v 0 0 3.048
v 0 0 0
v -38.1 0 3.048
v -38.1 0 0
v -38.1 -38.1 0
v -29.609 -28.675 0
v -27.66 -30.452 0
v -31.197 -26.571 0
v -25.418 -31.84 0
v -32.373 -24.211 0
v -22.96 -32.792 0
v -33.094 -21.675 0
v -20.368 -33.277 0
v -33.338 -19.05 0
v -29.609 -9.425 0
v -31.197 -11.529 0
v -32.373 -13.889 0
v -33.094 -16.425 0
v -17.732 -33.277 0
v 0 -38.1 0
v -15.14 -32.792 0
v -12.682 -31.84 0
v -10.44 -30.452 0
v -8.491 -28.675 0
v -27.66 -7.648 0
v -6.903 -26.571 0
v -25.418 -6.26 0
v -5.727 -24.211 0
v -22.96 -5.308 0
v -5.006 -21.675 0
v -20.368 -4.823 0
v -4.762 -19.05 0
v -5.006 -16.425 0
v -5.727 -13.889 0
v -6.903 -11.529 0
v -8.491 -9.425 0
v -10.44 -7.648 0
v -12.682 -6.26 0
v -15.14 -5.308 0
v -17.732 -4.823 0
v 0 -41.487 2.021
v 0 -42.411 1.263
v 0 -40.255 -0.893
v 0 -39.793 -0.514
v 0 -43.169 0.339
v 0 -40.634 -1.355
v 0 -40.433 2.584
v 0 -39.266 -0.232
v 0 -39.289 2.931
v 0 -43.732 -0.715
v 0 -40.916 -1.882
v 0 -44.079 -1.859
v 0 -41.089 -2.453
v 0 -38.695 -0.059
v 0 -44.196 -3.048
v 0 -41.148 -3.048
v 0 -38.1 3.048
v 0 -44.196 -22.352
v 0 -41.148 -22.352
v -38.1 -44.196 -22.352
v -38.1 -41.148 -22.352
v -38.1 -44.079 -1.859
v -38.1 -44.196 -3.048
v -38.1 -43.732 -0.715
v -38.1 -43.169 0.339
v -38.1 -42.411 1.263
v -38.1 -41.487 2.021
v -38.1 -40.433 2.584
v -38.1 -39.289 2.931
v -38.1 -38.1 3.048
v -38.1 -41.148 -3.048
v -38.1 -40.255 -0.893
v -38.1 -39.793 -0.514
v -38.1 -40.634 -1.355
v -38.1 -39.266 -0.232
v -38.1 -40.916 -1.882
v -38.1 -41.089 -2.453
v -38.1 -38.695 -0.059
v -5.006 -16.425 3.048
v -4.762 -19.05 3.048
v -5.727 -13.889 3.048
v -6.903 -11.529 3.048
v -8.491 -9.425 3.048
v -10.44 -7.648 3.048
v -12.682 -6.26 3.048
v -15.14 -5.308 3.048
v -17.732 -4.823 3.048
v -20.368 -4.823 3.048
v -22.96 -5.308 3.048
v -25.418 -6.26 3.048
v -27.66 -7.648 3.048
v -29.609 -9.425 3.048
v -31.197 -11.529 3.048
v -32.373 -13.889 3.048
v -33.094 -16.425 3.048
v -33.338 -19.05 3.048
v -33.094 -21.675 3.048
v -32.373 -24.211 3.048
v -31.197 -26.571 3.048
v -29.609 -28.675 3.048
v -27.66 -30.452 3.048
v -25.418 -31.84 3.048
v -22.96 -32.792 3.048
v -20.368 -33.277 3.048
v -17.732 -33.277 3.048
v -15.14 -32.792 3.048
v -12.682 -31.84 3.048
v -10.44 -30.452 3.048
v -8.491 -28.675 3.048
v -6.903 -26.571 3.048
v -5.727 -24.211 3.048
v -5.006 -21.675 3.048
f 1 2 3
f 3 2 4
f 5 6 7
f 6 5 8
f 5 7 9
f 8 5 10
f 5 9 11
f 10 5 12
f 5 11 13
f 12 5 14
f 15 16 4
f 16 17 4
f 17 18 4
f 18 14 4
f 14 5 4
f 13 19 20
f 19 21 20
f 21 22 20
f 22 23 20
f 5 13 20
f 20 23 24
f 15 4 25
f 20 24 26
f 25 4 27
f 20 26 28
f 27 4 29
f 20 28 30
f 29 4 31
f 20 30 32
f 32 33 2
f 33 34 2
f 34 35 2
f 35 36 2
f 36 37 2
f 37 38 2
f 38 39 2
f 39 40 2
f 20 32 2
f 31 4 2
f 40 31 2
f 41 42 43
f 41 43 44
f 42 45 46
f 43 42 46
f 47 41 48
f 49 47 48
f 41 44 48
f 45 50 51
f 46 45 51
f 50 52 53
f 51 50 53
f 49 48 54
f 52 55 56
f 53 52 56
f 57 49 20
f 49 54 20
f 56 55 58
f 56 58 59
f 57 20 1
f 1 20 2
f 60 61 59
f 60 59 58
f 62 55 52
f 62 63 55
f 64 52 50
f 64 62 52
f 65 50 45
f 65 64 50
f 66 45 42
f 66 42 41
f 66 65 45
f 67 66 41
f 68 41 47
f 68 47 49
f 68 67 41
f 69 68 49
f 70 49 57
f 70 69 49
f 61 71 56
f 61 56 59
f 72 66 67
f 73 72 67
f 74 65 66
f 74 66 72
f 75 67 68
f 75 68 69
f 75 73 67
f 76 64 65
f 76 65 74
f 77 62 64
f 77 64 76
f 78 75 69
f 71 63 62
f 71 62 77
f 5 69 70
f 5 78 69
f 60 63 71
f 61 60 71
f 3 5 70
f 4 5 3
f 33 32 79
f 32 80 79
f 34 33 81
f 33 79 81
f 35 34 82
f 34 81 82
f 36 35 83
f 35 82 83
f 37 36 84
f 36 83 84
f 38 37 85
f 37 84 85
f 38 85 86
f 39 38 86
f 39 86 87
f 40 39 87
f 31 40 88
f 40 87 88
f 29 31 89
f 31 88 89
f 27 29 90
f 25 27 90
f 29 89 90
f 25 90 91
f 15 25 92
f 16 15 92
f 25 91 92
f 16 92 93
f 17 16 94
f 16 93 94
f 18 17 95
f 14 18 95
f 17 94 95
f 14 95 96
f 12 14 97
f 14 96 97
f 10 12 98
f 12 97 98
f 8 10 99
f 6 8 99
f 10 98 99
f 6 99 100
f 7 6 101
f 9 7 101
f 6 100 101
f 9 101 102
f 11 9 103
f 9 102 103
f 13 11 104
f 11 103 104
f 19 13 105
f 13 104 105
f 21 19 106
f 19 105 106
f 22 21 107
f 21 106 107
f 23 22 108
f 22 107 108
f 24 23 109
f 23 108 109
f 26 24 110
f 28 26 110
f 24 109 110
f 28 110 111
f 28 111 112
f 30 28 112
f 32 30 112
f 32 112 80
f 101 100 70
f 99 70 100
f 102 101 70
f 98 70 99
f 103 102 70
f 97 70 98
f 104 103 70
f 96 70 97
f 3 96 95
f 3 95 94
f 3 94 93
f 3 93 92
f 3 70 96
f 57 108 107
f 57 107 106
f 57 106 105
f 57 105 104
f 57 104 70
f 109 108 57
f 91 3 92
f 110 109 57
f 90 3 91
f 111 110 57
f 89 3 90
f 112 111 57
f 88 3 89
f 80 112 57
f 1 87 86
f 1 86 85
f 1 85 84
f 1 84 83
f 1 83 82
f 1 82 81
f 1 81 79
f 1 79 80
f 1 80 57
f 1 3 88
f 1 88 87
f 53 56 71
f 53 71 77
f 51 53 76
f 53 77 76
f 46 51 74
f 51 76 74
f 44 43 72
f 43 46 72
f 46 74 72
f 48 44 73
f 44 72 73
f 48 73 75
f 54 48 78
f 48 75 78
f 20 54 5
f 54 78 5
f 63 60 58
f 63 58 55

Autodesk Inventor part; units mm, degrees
ref_plane "YZ Plane" through (0, 0, 0) normal (1, 0, 0) x (0, 1, 0)
ref_plane "XZ Plane" through (0, 0, 0) normal (0, 1, 0) x (-1, 0, 0)
ref_plane "XY Plane" through (0, 0, 0) normal (0, 0, 1) x (1, 0, 0)
sketch "Sketch1" plane through (0, 0, 0) normal (0, 0, 1) x (1, 0, 0)
  line L0 (0, 0) -> (-38.1, 0)
  line L1 (-19.05, 0) -> (-19.05, -38.1)
  line L2 (-19.05, -38.1) -> (-38.1, -38.1)
  line L3 (-38.1, -38.1) -> (-38.1, 0)
  line L4 (-19.05, -38.1) -> (0, -38.1)
  line L5 (0, 0) -> (0, -38.1)
  dimension "d0" = 38.1
  dimension "d1" = 38.1
  dimension "d2" = 19.05
  dimension "d3" = 19.05
extrude "Plate1" add sketch "Sketch1" along normal blind 3.048
sketch "Sketch2" plane through (0, 0, 3.048) normal (0, 0, 1) x (1, 0, 0)
  line L0 (-38.1, 0) -> (0, 0) projected
  line L1 (0, -38.1) -> (-38.1, -38.1) projected
  line L2 (-19.05, 0) -> (-19.05, -19.05)
  circle A0 centre (-19.05, -19.05) radius 14.2875
  dimension "d7" = 19.05
  dimension "d8" = 28.575
extrude "Cut1" cut sketch "Sketch2" against normal blind 3.048
sketch "Sketch3" plane through (-38.1, -41.148, -3.048) normal (0, -1, 0) x (1, 0, 0)
  line L0 (38.1, 0) -> (0, 0)
  line L1 (0, 0) -> (0, -19.304)
  line L2 (0, -19.304) -> (38.1, -19.304)
  line L3 (38.1, -19.304) -> (38.1, 0)
edge flange "Flange1" height 25.4 angle 90 thickness 3.048 bend radius 3.048 thickness toward (0, -1, 0) relief straight relief width 3.048 relief depth 1.524 edges at (-19.05, -38.1, 0) wall of the first edge with corners at (0, -41.148, -3.048) (-38.1, -41.148, -3.048) (-38.1, -41.148, -22.352) (0, -41.148, -22.352)
bend "Bend1"
corner "Corner1"
sketch "Sketch5" plane through (-38.1, -41.148, -22.352) normal (0, 1, 0) x (1, 0, 0)
  line L0 (0, -19.304) -> (38.1, -19.304) projected
  line L1 (38.1, 0) -> (38.1, -19.304) projected
  line L2 (38.1, 0) -> (0, 0) projected
  line L3 (0, 0) -> (0, -19.304) projected
  point P0 (38.1, -22.352)
equation "\"d9\" = Thickness"
equation "\"d11\" = BendReliefWidth"
equation "\"d12\" = BendReliefDepth"
equation "\"d13\" = MinimumRemnant"
equation "\"d14\" = BendRadius"
equation "\"d17\" = BendRadius"
equation "\"d18\" = CornerReliefSize"
equation "\"d19\" = GapSize"
equation "\"d20\" = JacobiRadiusSize"
equation "\"BendRadius\" = Thickness"
equation "\"BendReliefWidth\" = Thickness"
equation "\"BendReliefDepth\" = 0.5 * Thickness"
equation "\"CornerReliefSize\" = 4 * Thickness"
equation "\"MinimumRemnant\" = 2 * Thickness"
equation "\"TransitionRadius\" = BendRadius"
equation "\"JacobiRadiusSize\" = Thickness"
equation "\"GapSize\" = Thickness"
equation "\"d4\" = BendRadius"
equation "\"Thickness\" = 3.048"
properties part number "arm assembly outer mount"
